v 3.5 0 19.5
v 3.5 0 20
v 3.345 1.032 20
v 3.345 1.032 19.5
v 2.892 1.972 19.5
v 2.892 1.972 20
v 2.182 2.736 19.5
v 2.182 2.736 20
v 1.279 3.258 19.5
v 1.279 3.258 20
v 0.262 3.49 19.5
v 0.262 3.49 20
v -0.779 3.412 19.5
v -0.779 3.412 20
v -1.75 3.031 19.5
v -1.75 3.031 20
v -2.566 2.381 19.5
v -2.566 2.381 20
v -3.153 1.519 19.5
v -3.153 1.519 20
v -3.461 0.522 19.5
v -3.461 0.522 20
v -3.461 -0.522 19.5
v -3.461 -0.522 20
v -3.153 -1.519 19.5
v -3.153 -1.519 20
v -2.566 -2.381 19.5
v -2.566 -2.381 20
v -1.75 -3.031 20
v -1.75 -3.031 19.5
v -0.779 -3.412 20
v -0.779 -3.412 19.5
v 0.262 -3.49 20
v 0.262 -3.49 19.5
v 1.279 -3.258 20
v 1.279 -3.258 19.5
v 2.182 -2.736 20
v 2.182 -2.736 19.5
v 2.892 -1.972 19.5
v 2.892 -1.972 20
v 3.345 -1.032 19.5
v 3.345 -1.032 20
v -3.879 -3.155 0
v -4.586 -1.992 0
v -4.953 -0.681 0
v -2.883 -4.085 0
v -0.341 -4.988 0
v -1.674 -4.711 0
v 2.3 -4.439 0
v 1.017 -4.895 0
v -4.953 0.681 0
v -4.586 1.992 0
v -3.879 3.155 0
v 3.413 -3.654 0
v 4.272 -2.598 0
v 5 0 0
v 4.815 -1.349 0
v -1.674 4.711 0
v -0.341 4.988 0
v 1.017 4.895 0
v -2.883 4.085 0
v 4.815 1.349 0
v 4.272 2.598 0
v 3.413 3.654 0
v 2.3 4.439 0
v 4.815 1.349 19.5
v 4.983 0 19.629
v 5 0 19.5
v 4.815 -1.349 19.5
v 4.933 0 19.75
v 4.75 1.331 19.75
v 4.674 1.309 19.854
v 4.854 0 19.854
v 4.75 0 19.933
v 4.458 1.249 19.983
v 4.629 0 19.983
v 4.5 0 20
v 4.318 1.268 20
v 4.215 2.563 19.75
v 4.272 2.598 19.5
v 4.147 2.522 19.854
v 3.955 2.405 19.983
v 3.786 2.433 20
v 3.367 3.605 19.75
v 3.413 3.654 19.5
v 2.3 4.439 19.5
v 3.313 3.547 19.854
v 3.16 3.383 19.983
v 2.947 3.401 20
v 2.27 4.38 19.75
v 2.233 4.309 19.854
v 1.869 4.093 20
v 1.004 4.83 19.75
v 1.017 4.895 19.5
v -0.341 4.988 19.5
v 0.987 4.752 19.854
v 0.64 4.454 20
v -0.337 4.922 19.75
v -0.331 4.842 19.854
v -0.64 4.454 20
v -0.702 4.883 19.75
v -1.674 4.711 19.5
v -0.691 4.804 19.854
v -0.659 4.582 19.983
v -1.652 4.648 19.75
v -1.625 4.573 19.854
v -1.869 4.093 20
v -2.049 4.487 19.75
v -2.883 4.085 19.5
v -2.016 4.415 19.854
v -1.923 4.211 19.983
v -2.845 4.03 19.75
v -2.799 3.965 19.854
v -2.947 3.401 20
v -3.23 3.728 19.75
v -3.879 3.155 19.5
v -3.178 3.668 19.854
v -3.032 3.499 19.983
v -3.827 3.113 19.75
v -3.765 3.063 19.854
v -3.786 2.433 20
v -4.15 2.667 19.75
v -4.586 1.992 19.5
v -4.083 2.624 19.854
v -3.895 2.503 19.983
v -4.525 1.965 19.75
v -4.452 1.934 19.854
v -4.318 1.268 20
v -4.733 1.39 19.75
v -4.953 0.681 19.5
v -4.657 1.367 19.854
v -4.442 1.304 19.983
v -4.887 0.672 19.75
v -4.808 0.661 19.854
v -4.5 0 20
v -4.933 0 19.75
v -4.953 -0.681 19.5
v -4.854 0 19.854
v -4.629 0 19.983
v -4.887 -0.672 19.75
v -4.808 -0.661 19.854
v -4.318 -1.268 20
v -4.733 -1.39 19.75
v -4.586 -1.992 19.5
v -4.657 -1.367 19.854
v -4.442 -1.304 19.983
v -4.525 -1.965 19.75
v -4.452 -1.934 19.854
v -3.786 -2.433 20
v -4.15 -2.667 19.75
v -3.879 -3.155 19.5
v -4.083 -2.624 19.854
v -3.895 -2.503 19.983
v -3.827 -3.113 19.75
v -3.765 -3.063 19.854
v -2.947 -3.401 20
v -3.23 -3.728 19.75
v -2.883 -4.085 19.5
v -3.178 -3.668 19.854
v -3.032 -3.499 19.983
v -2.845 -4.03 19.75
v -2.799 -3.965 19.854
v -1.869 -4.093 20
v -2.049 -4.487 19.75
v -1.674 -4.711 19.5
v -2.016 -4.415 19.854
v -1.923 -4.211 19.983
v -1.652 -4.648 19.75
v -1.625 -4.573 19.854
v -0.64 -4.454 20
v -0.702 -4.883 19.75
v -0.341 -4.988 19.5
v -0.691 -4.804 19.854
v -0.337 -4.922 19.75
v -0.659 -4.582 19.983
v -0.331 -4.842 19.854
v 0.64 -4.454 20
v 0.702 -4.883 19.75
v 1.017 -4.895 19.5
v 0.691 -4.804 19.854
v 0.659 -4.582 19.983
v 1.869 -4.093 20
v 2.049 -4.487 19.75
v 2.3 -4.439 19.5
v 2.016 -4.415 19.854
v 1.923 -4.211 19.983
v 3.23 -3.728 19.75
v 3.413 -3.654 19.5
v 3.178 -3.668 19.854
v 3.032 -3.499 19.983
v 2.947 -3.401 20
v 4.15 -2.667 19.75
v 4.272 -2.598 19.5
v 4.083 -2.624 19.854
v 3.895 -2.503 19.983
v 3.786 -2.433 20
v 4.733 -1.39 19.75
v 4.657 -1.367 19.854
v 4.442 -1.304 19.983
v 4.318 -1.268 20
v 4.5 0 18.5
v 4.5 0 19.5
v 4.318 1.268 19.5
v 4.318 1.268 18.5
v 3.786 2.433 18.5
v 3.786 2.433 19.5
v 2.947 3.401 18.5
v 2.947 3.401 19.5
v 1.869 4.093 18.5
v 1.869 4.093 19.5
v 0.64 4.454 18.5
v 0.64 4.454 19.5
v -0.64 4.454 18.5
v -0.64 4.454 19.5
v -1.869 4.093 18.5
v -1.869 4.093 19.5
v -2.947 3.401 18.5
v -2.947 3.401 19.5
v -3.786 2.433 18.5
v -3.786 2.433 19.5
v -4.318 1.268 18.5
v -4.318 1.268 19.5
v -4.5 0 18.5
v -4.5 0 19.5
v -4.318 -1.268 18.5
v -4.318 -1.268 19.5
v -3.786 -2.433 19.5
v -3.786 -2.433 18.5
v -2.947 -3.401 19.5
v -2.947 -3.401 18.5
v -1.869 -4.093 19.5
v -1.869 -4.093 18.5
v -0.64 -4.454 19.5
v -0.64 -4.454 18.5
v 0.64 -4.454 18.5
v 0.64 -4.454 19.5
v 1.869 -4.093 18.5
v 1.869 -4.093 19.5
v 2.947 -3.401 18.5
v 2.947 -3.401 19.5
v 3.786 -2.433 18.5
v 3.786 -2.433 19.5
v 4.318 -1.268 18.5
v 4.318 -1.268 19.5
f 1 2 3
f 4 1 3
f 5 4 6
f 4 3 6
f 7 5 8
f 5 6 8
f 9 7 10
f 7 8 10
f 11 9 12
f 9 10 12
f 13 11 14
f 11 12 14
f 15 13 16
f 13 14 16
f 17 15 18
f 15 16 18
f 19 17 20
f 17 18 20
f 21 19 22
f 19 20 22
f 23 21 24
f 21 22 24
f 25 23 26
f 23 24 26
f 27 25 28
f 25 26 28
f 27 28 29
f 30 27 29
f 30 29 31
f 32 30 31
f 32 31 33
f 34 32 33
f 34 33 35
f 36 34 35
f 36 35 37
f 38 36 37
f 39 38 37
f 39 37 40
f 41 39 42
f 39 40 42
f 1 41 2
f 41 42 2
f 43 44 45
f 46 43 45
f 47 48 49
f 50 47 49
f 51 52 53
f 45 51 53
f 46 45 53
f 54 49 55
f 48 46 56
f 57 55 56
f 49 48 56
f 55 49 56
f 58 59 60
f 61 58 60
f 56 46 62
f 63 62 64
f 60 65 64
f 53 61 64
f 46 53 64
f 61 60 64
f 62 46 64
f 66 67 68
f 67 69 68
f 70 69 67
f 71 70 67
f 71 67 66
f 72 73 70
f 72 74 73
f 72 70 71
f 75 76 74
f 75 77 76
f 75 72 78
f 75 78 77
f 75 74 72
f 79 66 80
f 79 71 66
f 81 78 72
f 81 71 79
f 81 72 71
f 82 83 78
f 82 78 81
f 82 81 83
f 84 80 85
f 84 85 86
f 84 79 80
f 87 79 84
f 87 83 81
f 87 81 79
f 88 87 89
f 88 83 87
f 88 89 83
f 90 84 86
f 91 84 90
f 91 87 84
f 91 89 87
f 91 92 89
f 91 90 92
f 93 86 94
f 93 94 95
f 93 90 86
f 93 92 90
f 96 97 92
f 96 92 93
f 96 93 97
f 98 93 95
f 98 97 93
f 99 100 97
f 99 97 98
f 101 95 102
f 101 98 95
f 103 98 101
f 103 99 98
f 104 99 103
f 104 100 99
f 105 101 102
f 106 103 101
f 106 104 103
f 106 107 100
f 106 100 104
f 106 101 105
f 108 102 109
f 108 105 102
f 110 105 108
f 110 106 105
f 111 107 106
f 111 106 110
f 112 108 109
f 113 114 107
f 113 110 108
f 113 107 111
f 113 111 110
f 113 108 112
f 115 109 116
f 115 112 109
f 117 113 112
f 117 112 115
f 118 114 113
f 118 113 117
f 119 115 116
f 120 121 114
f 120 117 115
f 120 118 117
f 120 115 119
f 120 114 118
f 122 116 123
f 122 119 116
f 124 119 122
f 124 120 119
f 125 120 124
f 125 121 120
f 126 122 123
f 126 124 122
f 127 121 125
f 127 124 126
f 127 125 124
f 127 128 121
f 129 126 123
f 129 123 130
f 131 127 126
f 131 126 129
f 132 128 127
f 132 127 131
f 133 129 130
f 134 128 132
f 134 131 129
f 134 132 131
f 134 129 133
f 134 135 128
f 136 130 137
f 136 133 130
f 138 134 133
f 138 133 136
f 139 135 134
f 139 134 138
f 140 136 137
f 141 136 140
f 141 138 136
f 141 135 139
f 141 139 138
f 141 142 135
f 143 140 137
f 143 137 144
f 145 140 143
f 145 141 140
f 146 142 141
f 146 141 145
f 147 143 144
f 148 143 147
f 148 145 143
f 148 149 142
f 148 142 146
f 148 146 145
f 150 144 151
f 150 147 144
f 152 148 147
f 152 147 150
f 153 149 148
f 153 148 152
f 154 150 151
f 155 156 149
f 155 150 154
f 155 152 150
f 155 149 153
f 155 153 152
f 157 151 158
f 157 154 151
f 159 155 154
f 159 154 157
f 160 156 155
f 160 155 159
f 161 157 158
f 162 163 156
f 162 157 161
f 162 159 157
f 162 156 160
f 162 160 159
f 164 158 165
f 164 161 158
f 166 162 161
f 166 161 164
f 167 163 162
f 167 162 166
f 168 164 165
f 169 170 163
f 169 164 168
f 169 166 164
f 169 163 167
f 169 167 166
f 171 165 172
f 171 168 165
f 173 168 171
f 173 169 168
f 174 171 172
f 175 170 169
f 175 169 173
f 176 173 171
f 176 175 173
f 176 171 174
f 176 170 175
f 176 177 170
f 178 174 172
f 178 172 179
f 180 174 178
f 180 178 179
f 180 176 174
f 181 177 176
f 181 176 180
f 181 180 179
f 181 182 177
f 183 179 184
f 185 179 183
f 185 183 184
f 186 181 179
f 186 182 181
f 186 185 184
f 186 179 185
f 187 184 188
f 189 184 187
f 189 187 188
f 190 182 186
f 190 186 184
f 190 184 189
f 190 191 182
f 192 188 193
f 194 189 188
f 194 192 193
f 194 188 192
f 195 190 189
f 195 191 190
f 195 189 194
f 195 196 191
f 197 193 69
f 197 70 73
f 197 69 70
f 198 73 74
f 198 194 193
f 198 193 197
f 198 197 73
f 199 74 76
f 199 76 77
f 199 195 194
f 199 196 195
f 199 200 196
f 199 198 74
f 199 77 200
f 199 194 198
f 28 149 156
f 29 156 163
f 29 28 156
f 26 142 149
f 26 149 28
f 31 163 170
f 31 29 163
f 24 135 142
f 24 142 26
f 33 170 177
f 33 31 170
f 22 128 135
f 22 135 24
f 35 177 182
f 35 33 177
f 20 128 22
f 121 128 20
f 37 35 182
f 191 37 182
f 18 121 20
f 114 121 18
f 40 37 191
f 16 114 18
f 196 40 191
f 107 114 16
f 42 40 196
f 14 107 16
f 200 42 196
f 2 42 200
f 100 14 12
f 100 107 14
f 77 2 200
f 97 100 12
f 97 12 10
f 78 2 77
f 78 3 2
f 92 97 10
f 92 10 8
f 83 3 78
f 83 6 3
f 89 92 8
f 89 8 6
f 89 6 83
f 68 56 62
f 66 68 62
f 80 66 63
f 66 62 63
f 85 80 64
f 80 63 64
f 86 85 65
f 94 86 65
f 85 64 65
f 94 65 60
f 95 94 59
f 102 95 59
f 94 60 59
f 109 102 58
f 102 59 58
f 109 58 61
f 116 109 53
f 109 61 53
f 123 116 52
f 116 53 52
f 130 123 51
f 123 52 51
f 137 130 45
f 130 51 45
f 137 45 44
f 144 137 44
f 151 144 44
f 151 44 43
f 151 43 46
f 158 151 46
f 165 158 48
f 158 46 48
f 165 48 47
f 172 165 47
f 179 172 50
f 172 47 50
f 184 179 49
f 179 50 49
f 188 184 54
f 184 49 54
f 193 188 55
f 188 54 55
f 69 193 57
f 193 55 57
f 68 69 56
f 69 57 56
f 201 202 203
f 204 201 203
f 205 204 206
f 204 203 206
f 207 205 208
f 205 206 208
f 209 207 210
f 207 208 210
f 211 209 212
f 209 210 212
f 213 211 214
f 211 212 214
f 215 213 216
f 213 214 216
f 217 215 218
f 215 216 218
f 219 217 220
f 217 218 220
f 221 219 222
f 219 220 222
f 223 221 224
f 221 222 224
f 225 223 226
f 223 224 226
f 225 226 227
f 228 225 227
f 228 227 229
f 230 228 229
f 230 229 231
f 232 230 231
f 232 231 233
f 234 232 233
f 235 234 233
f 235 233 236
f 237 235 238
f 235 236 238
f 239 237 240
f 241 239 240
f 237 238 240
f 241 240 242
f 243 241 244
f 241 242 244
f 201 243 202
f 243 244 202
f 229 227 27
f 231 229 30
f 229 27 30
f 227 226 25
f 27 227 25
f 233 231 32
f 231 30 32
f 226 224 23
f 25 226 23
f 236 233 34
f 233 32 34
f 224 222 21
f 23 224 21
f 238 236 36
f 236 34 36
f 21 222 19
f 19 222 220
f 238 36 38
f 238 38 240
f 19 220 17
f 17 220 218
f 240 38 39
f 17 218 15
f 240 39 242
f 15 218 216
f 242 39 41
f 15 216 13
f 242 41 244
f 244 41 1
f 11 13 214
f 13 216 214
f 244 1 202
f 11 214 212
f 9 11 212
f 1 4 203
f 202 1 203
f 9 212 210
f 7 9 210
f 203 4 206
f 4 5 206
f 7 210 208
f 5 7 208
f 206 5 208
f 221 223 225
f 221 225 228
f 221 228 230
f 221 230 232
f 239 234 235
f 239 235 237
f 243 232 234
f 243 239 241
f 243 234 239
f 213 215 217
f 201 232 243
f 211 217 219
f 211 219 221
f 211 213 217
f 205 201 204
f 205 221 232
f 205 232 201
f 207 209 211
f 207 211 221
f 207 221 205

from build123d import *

# Parameters (mm, degrees)
SKETCH033_R     = 5
PAD018_DEPTH    = 20
SKETCH034_R     = 3.5
POCKET016_DEPTH = 0.5
SKETCH037_R     = 4.5
POCKET018_DEPTH = 1
FILLET003_R     = 0.5


with BuildPart() as part:
    # Sketch033 → Pad018 (new body)
    with BuildSketch(Plane.XY):
        Circle(SKETCH033_R)
    extrude(amount=PAD018_DEPTH)

    # Sketch034 (on Face3 of Pad018) → Pocket016 (cut)
    with BuildSketch(Plane.XY.offset(20)):
        Circle(SKETCH034_R)
    extrude(amount=-POCKET016_DEPTH, mode=Mode.SUBTRACT)

    # Sketch037 (on Face5 of Pocket016) → Pocket018 (cut)
    with BuildSketch(Plane.XY.offset(19.5)):
        Circle(SKETCH037_R)
    extrude(amount=-POCKET018_DEPTH, mode=Mode.SUBTRACT)

    # Fillet003
    fillet003_edges = [part.edges().sort_by_distance(p)[0] for p in [
        (-5, 0, 20),
    ]]
    fillet(fillet003_edges, radius=FILLET003_R)


solid = part.part
